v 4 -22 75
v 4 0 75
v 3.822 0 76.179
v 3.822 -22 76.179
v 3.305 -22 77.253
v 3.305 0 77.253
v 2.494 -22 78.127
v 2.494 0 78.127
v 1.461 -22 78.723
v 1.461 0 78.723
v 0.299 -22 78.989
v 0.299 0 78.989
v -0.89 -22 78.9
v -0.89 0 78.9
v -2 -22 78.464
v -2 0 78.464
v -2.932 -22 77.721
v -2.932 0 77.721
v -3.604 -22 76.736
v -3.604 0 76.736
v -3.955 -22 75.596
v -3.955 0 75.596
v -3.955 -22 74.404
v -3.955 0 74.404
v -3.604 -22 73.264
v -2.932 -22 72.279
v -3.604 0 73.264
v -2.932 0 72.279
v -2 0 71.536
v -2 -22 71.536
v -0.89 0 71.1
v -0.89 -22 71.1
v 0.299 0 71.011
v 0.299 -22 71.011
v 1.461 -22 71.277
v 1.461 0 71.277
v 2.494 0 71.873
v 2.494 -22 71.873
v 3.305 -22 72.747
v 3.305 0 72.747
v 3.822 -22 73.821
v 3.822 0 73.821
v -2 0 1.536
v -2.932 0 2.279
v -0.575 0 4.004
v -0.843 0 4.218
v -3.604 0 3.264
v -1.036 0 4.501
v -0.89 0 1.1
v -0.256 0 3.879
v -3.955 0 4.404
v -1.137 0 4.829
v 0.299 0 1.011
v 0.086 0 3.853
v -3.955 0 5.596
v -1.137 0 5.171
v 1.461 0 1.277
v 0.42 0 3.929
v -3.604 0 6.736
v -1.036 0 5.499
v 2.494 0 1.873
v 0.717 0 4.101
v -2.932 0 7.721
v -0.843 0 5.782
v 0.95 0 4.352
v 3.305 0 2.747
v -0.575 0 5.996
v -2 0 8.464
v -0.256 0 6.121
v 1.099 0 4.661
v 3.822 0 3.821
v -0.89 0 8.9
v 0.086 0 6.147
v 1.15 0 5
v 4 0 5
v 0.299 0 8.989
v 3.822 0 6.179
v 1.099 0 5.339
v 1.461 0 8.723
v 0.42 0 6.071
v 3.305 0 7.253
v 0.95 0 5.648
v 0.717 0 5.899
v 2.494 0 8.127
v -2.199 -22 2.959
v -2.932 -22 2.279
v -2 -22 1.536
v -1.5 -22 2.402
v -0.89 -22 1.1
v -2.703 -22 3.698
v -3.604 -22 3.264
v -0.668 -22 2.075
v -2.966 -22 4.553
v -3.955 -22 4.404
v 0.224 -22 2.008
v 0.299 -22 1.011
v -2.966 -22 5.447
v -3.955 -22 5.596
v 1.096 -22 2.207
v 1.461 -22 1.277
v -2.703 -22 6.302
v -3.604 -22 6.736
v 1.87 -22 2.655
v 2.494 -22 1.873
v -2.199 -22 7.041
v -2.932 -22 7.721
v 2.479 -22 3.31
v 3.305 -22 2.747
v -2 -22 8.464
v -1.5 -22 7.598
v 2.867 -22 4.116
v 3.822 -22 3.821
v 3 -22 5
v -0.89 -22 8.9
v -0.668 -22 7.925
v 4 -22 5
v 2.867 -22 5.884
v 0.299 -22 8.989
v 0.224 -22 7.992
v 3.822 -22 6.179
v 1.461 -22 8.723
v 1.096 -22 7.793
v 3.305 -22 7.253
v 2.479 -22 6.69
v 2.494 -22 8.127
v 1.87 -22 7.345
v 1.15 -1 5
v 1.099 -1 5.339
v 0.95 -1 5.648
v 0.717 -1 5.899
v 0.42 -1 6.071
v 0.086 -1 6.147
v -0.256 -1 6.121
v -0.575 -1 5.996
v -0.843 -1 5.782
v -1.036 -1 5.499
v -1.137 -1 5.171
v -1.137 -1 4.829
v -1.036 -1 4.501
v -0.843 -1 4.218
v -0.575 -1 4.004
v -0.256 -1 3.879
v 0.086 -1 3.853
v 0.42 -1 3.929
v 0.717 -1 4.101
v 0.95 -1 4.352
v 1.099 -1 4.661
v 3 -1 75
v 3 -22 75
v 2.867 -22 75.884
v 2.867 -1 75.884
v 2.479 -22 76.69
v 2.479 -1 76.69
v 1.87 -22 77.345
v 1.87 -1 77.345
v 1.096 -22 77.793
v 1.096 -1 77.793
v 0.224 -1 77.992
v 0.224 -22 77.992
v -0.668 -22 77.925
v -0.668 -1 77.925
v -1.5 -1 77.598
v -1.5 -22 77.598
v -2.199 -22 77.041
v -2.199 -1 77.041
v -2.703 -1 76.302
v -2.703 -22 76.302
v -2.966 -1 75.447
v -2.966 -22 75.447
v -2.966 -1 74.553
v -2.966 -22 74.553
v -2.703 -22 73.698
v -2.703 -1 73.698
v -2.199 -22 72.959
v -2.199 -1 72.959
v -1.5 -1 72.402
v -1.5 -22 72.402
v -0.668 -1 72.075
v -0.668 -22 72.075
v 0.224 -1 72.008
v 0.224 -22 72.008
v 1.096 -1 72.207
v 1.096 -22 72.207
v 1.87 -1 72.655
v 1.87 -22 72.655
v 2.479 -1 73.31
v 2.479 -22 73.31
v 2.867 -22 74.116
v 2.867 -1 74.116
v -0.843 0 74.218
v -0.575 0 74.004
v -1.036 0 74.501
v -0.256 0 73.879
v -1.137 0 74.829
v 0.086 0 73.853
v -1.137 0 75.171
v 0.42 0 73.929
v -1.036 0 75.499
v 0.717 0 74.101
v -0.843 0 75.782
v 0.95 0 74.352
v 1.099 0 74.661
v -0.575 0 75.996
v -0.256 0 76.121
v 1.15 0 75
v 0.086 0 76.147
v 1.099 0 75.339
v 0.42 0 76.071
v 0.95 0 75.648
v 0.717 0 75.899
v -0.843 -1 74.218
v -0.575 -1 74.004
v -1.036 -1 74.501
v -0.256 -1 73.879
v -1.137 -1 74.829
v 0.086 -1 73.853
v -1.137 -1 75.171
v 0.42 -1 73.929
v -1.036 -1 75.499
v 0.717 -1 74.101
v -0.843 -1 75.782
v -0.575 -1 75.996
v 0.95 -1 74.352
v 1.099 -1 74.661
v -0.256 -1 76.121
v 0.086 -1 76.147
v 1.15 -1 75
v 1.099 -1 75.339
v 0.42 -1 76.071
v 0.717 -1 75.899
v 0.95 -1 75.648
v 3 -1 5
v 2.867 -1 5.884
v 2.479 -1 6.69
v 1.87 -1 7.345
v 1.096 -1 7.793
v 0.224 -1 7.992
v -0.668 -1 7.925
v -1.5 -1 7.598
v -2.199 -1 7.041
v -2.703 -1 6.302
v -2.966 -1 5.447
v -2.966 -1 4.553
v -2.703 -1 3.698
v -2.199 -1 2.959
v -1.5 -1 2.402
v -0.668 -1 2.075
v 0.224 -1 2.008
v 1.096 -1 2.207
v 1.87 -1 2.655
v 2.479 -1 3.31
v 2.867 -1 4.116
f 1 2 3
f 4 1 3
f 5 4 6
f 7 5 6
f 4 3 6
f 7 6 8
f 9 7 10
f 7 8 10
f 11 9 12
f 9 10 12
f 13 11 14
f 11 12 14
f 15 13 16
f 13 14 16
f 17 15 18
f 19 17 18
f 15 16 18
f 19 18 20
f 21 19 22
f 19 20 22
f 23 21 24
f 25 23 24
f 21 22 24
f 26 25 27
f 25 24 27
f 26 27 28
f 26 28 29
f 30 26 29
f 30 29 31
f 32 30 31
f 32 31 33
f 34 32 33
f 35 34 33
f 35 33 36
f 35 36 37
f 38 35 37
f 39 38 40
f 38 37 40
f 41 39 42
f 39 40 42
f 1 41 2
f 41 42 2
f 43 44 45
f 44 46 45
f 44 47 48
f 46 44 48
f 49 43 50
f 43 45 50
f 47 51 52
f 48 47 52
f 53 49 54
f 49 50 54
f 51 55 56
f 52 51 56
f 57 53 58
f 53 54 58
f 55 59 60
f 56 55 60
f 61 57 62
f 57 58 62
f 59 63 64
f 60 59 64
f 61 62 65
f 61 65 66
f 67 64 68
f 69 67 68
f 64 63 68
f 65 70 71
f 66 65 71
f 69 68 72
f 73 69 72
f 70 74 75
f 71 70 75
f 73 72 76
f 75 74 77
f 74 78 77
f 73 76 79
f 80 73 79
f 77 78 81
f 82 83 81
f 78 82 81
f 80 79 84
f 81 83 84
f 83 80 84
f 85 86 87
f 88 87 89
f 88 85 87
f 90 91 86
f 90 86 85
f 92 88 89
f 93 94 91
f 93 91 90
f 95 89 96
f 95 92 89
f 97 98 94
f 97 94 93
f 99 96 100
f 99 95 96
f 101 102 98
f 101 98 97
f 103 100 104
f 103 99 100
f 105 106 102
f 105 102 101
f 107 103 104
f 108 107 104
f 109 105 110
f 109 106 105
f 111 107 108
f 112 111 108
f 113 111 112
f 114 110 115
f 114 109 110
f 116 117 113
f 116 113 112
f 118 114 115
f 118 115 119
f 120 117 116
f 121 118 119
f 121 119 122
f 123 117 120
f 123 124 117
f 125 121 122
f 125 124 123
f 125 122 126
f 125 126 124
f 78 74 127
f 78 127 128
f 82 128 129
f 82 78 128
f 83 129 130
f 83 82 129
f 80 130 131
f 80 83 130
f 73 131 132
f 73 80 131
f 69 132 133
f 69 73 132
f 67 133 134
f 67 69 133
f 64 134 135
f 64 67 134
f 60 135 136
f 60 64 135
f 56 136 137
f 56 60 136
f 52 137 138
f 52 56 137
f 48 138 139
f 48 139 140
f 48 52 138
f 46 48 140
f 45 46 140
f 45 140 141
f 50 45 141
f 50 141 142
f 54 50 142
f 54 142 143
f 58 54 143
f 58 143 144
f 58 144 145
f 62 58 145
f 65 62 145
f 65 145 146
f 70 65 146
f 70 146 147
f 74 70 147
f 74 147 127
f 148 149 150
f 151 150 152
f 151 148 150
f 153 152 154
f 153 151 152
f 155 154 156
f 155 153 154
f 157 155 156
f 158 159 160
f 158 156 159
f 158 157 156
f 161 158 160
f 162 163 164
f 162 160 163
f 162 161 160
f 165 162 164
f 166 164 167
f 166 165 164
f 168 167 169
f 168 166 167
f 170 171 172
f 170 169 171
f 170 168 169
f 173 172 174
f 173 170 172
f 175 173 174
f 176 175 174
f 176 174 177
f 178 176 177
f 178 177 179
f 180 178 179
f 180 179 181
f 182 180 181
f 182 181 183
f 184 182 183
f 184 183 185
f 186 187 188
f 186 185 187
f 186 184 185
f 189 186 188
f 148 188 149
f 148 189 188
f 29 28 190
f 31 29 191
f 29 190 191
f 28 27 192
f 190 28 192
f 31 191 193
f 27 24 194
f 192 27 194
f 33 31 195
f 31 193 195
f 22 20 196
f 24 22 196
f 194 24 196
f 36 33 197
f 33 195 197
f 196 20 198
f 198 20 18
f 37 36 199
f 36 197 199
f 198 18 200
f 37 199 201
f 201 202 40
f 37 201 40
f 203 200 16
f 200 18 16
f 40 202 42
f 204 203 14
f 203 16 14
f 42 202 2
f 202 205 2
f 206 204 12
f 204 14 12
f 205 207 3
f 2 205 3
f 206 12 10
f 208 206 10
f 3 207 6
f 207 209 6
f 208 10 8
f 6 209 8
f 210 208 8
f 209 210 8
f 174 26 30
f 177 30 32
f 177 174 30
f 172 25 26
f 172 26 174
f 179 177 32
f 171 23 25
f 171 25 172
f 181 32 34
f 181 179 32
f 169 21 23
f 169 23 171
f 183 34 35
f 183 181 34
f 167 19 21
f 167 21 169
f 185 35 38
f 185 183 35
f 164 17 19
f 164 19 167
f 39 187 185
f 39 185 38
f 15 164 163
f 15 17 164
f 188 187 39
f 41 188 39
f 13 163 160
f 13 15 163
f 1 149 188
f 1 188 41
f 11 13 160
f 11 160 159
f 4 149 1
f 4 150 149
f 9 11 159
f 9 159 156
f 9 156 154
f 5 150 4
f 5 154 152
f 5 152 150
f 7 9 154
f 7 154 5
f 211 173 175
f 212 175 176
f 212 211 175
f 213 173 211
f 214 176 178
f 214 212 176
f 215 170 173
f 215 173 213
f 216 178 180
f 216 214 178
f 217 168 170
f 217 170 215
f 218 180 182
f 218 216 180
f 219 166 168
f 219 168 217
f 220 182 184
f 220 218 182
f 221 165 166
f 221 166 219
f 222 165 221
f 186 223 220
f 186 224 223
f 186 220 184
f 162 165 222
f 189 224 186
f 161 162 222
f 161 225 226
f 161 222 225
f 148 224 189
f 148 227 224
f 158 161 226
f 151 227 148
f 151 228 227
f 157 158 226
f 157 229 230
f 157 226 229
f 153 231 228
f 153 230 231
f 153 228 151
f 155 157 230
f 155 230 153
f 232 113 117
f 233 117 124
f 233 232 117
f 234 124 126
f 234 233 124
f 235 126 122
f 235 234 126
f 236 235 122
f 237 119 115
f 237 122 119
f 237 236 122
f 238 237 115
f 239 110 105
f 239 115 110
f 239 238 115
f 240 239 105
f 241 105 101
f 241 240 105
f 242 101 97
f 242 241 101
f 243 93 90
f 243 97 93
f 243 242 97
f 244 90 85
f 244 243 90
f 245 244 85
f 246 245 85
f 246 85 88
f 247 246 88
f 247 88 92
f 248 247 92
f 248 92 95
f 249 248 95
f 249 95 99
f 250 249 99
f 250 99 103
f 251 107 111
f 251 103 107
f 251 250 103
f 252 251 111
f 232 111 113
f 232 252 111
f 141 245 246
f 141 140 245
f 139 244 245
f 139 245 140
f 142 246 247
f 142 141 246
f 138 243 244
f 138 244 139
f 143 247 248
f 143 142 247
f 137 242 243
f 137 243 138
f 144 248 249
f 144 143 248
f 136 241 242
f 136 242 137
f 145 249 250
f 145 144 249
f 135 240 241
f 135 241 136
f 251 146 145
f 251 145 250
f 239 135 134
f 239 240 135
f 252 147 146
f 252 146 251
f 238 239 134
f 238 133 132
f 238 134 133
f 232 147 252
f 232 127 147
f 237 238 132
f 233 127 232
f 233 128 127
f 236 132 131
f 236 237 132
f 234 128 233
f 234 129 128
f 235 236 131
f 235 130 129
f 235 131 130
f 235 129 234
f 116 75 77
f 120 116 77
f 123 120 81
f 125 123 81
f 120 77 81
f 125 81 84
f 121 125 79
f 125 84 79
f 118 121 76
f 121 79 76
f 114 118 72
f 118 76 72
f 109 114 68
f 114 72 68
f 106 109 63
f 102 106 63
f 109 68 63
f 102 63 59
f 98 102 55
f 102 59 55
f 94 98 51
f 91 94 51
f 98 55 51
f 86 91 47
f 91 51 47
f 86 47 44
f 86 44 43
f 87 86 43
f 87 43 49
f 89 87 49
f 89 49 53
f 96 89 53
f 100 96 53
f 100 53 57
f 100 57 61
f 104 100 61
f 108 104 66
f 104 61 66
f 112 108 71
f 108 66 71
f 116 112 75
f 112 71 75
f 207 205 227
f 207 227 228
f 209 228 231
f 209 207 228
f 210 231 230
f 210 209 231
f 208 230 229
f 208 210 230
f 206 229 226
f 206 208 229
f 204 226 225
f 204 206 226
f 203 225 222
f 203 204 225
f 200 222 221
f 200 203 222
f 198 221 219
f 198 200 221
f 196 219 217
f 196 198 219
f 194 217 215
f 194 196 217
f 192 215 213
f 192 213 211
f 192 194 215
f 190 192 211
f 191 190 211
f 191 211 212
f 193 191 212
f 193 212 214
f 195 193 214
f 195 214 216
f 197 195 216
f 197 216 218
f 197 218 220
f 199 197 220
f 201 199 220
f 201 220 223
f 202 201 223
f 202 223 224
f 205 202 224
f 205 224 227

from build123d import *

# Parameters (mm, degrees)
CYLINDER014_R          = 3
CYLINDER014_DEPTH      = 22
CYLINDER014_ROLL_ANGLE = 90
CYLINDER012_R          = 1.15
CYLINDER012_DEPTH      = 6
CYLINDER012_ROLL_ANGLE = 90
CYLINDER011_R          = 4
CYLINDER011_DEPTH      = 22
CYLINDER011_ROLL_ANGLE = 90
CYLINDER_R             = 3
CYLINDER_DEPTH         = 22
CYLINDER_ROLL_ANGLE    = 90
CYLINDER013_R          = 1.15
CYLINDER013_DEPTH      = 6
CYLINDER013_ROLL_ANGLE = 90
CYLINDER010_R          = 4
CYLINDER010_DEPTH      = 22
CYLINDER010_ROLL_ANGLE = 90


with BuildPart() as cylinder014:
    # Cylinder014 → Cylinder014 (new body)
    with BuildSketch(Plane.XY):
        Circle(CYLINDER014_R)
    extrude(amount=CYLINDER014_DEPTH)


with BuildPart() as cylinder014_1:
    # Cylinder014 roll: moved
    add(cylinder014.part.rotate(Axis((0, 0, 0), (1, 0, 0)), CYLINDER014_ROLL_ANGLE))


with BuildPart() as cylinder014_2:
    # Cylinder014 placement: moved
    add(cylinder014_1.part.moved(Location((0, -1, 5))))


with BuildPart() as fusion004:
    # Cylinder012 → Cylinder012 (new body)
    with BuildSketch(Plane.XY):
        Circle(CYLINDER012_R)
    extrude(amount=CYLINDER012_DEPTH)


with BuildPart() as fusion004_1:
    # Cylinder012 roll: moved
    add(fusion004.part.rotate(Axis((0, 0, 0), (1, 0, 0)), CYLINDER012_ROLL_ANGLE))


with BuildPart() as fusion004_2:
    # Cylinder012 placement: moved
    add(fusion004_1.part.moved(Location((0, 5, 5))))

    # Fusion004: union Cylinder014
    add(cylinder014_2.part)


with BuildPart() as cut001:
    # Cylinder011 → Cylinder011 (new body)
    with BuildSketch(Plane.XY):
        Circle(CYLINDER011_R)
    extrude(amount=CYLINDER011_DEPTH)


with BuildPart() as cut001_1:
    # Cylinder011 roll: moved
    add(cut001.part.rotate(Axis((0, 0, 0), (1, 0, 0)), CYLINDER011_ROLL_ANGLE))


with BuildPart() as cut001_2:
    # Cylinder011 placement: moved
    add(cut001_1.part.moved(Location((0, 0, 5))))

    # Cut001: cut Fusion004
    add(fusion004_2.part, mode=Mode.SUBTRACT)


with BuildPart() as cylinder:
    # Cylinder → Cylinder (new body)
    with BuildSketch(Plane.XY):
        Circle(CYLINDER_R)
    extrude(amount=CYLINDER_DEPTH)


with BuildPart() as cylinder_1:
    # Cylinder roll: moved
    add(cylinder.part.rotate(Axis((0, 0, 0), (1, 0, 0)), CYLINDER_ROLL_ANGLE))


with BuildPart() as cylinder_2:
    # Cylinder placement: moved
    add(cylinder_1.part.moved(Location((0, -1, 75))))


with BuildPart() as fusion:
    # Cylinder013 → Cylinder013 (new body)
    with BuildSketch(Plane.XY):
        Circle(CYLINDER013_R)
    extrude(amount=CYLINDER013_DEPTH)


with BuildPart() as fusion_1:
    # Cylinder013 roll: moved
    add(fusion.part.rotate(Axis((0, 0, 0), (1, 0, 0)), CYLINDER013_ROLL_ANGLE))


with BuildPart() as fusion_2:
    # Cylinder013 placement: moved
    add(fusion_1.part.moved(Location((0, 5, 75))))

    # Fusion: union Cylinder
    add(cylinder_2.part)


with BuildPart() as fusion005:
    # Cylinder010 → Cylinder010 (new body)
    with BuildSketch(Plane.XY):
        Circle(CYLINDER010_R)
    extrude(amount=CYLINDER010_DEPTH)


with BuildPart() as fusion005_1:
    # Cylinder010 roll: moved
    add(fusion005.part.rotate(Axis((0, 0, 0), (1, 0, 0)), CYLINDER010_ROLL_ANGLE))


with BuildPart() as fusion005_2:
    # Cylinder010 placement: moved
    add(fusion005_1.part.moved(Location((0, 0, 75))))

    # Cut002: cut Fusion
    add(fusion_2.part, mode=Mode.SUBTRACT)

    # Fusion005: union Cut001
    add(cut001_2.part)


solid = fusion005_2.part
